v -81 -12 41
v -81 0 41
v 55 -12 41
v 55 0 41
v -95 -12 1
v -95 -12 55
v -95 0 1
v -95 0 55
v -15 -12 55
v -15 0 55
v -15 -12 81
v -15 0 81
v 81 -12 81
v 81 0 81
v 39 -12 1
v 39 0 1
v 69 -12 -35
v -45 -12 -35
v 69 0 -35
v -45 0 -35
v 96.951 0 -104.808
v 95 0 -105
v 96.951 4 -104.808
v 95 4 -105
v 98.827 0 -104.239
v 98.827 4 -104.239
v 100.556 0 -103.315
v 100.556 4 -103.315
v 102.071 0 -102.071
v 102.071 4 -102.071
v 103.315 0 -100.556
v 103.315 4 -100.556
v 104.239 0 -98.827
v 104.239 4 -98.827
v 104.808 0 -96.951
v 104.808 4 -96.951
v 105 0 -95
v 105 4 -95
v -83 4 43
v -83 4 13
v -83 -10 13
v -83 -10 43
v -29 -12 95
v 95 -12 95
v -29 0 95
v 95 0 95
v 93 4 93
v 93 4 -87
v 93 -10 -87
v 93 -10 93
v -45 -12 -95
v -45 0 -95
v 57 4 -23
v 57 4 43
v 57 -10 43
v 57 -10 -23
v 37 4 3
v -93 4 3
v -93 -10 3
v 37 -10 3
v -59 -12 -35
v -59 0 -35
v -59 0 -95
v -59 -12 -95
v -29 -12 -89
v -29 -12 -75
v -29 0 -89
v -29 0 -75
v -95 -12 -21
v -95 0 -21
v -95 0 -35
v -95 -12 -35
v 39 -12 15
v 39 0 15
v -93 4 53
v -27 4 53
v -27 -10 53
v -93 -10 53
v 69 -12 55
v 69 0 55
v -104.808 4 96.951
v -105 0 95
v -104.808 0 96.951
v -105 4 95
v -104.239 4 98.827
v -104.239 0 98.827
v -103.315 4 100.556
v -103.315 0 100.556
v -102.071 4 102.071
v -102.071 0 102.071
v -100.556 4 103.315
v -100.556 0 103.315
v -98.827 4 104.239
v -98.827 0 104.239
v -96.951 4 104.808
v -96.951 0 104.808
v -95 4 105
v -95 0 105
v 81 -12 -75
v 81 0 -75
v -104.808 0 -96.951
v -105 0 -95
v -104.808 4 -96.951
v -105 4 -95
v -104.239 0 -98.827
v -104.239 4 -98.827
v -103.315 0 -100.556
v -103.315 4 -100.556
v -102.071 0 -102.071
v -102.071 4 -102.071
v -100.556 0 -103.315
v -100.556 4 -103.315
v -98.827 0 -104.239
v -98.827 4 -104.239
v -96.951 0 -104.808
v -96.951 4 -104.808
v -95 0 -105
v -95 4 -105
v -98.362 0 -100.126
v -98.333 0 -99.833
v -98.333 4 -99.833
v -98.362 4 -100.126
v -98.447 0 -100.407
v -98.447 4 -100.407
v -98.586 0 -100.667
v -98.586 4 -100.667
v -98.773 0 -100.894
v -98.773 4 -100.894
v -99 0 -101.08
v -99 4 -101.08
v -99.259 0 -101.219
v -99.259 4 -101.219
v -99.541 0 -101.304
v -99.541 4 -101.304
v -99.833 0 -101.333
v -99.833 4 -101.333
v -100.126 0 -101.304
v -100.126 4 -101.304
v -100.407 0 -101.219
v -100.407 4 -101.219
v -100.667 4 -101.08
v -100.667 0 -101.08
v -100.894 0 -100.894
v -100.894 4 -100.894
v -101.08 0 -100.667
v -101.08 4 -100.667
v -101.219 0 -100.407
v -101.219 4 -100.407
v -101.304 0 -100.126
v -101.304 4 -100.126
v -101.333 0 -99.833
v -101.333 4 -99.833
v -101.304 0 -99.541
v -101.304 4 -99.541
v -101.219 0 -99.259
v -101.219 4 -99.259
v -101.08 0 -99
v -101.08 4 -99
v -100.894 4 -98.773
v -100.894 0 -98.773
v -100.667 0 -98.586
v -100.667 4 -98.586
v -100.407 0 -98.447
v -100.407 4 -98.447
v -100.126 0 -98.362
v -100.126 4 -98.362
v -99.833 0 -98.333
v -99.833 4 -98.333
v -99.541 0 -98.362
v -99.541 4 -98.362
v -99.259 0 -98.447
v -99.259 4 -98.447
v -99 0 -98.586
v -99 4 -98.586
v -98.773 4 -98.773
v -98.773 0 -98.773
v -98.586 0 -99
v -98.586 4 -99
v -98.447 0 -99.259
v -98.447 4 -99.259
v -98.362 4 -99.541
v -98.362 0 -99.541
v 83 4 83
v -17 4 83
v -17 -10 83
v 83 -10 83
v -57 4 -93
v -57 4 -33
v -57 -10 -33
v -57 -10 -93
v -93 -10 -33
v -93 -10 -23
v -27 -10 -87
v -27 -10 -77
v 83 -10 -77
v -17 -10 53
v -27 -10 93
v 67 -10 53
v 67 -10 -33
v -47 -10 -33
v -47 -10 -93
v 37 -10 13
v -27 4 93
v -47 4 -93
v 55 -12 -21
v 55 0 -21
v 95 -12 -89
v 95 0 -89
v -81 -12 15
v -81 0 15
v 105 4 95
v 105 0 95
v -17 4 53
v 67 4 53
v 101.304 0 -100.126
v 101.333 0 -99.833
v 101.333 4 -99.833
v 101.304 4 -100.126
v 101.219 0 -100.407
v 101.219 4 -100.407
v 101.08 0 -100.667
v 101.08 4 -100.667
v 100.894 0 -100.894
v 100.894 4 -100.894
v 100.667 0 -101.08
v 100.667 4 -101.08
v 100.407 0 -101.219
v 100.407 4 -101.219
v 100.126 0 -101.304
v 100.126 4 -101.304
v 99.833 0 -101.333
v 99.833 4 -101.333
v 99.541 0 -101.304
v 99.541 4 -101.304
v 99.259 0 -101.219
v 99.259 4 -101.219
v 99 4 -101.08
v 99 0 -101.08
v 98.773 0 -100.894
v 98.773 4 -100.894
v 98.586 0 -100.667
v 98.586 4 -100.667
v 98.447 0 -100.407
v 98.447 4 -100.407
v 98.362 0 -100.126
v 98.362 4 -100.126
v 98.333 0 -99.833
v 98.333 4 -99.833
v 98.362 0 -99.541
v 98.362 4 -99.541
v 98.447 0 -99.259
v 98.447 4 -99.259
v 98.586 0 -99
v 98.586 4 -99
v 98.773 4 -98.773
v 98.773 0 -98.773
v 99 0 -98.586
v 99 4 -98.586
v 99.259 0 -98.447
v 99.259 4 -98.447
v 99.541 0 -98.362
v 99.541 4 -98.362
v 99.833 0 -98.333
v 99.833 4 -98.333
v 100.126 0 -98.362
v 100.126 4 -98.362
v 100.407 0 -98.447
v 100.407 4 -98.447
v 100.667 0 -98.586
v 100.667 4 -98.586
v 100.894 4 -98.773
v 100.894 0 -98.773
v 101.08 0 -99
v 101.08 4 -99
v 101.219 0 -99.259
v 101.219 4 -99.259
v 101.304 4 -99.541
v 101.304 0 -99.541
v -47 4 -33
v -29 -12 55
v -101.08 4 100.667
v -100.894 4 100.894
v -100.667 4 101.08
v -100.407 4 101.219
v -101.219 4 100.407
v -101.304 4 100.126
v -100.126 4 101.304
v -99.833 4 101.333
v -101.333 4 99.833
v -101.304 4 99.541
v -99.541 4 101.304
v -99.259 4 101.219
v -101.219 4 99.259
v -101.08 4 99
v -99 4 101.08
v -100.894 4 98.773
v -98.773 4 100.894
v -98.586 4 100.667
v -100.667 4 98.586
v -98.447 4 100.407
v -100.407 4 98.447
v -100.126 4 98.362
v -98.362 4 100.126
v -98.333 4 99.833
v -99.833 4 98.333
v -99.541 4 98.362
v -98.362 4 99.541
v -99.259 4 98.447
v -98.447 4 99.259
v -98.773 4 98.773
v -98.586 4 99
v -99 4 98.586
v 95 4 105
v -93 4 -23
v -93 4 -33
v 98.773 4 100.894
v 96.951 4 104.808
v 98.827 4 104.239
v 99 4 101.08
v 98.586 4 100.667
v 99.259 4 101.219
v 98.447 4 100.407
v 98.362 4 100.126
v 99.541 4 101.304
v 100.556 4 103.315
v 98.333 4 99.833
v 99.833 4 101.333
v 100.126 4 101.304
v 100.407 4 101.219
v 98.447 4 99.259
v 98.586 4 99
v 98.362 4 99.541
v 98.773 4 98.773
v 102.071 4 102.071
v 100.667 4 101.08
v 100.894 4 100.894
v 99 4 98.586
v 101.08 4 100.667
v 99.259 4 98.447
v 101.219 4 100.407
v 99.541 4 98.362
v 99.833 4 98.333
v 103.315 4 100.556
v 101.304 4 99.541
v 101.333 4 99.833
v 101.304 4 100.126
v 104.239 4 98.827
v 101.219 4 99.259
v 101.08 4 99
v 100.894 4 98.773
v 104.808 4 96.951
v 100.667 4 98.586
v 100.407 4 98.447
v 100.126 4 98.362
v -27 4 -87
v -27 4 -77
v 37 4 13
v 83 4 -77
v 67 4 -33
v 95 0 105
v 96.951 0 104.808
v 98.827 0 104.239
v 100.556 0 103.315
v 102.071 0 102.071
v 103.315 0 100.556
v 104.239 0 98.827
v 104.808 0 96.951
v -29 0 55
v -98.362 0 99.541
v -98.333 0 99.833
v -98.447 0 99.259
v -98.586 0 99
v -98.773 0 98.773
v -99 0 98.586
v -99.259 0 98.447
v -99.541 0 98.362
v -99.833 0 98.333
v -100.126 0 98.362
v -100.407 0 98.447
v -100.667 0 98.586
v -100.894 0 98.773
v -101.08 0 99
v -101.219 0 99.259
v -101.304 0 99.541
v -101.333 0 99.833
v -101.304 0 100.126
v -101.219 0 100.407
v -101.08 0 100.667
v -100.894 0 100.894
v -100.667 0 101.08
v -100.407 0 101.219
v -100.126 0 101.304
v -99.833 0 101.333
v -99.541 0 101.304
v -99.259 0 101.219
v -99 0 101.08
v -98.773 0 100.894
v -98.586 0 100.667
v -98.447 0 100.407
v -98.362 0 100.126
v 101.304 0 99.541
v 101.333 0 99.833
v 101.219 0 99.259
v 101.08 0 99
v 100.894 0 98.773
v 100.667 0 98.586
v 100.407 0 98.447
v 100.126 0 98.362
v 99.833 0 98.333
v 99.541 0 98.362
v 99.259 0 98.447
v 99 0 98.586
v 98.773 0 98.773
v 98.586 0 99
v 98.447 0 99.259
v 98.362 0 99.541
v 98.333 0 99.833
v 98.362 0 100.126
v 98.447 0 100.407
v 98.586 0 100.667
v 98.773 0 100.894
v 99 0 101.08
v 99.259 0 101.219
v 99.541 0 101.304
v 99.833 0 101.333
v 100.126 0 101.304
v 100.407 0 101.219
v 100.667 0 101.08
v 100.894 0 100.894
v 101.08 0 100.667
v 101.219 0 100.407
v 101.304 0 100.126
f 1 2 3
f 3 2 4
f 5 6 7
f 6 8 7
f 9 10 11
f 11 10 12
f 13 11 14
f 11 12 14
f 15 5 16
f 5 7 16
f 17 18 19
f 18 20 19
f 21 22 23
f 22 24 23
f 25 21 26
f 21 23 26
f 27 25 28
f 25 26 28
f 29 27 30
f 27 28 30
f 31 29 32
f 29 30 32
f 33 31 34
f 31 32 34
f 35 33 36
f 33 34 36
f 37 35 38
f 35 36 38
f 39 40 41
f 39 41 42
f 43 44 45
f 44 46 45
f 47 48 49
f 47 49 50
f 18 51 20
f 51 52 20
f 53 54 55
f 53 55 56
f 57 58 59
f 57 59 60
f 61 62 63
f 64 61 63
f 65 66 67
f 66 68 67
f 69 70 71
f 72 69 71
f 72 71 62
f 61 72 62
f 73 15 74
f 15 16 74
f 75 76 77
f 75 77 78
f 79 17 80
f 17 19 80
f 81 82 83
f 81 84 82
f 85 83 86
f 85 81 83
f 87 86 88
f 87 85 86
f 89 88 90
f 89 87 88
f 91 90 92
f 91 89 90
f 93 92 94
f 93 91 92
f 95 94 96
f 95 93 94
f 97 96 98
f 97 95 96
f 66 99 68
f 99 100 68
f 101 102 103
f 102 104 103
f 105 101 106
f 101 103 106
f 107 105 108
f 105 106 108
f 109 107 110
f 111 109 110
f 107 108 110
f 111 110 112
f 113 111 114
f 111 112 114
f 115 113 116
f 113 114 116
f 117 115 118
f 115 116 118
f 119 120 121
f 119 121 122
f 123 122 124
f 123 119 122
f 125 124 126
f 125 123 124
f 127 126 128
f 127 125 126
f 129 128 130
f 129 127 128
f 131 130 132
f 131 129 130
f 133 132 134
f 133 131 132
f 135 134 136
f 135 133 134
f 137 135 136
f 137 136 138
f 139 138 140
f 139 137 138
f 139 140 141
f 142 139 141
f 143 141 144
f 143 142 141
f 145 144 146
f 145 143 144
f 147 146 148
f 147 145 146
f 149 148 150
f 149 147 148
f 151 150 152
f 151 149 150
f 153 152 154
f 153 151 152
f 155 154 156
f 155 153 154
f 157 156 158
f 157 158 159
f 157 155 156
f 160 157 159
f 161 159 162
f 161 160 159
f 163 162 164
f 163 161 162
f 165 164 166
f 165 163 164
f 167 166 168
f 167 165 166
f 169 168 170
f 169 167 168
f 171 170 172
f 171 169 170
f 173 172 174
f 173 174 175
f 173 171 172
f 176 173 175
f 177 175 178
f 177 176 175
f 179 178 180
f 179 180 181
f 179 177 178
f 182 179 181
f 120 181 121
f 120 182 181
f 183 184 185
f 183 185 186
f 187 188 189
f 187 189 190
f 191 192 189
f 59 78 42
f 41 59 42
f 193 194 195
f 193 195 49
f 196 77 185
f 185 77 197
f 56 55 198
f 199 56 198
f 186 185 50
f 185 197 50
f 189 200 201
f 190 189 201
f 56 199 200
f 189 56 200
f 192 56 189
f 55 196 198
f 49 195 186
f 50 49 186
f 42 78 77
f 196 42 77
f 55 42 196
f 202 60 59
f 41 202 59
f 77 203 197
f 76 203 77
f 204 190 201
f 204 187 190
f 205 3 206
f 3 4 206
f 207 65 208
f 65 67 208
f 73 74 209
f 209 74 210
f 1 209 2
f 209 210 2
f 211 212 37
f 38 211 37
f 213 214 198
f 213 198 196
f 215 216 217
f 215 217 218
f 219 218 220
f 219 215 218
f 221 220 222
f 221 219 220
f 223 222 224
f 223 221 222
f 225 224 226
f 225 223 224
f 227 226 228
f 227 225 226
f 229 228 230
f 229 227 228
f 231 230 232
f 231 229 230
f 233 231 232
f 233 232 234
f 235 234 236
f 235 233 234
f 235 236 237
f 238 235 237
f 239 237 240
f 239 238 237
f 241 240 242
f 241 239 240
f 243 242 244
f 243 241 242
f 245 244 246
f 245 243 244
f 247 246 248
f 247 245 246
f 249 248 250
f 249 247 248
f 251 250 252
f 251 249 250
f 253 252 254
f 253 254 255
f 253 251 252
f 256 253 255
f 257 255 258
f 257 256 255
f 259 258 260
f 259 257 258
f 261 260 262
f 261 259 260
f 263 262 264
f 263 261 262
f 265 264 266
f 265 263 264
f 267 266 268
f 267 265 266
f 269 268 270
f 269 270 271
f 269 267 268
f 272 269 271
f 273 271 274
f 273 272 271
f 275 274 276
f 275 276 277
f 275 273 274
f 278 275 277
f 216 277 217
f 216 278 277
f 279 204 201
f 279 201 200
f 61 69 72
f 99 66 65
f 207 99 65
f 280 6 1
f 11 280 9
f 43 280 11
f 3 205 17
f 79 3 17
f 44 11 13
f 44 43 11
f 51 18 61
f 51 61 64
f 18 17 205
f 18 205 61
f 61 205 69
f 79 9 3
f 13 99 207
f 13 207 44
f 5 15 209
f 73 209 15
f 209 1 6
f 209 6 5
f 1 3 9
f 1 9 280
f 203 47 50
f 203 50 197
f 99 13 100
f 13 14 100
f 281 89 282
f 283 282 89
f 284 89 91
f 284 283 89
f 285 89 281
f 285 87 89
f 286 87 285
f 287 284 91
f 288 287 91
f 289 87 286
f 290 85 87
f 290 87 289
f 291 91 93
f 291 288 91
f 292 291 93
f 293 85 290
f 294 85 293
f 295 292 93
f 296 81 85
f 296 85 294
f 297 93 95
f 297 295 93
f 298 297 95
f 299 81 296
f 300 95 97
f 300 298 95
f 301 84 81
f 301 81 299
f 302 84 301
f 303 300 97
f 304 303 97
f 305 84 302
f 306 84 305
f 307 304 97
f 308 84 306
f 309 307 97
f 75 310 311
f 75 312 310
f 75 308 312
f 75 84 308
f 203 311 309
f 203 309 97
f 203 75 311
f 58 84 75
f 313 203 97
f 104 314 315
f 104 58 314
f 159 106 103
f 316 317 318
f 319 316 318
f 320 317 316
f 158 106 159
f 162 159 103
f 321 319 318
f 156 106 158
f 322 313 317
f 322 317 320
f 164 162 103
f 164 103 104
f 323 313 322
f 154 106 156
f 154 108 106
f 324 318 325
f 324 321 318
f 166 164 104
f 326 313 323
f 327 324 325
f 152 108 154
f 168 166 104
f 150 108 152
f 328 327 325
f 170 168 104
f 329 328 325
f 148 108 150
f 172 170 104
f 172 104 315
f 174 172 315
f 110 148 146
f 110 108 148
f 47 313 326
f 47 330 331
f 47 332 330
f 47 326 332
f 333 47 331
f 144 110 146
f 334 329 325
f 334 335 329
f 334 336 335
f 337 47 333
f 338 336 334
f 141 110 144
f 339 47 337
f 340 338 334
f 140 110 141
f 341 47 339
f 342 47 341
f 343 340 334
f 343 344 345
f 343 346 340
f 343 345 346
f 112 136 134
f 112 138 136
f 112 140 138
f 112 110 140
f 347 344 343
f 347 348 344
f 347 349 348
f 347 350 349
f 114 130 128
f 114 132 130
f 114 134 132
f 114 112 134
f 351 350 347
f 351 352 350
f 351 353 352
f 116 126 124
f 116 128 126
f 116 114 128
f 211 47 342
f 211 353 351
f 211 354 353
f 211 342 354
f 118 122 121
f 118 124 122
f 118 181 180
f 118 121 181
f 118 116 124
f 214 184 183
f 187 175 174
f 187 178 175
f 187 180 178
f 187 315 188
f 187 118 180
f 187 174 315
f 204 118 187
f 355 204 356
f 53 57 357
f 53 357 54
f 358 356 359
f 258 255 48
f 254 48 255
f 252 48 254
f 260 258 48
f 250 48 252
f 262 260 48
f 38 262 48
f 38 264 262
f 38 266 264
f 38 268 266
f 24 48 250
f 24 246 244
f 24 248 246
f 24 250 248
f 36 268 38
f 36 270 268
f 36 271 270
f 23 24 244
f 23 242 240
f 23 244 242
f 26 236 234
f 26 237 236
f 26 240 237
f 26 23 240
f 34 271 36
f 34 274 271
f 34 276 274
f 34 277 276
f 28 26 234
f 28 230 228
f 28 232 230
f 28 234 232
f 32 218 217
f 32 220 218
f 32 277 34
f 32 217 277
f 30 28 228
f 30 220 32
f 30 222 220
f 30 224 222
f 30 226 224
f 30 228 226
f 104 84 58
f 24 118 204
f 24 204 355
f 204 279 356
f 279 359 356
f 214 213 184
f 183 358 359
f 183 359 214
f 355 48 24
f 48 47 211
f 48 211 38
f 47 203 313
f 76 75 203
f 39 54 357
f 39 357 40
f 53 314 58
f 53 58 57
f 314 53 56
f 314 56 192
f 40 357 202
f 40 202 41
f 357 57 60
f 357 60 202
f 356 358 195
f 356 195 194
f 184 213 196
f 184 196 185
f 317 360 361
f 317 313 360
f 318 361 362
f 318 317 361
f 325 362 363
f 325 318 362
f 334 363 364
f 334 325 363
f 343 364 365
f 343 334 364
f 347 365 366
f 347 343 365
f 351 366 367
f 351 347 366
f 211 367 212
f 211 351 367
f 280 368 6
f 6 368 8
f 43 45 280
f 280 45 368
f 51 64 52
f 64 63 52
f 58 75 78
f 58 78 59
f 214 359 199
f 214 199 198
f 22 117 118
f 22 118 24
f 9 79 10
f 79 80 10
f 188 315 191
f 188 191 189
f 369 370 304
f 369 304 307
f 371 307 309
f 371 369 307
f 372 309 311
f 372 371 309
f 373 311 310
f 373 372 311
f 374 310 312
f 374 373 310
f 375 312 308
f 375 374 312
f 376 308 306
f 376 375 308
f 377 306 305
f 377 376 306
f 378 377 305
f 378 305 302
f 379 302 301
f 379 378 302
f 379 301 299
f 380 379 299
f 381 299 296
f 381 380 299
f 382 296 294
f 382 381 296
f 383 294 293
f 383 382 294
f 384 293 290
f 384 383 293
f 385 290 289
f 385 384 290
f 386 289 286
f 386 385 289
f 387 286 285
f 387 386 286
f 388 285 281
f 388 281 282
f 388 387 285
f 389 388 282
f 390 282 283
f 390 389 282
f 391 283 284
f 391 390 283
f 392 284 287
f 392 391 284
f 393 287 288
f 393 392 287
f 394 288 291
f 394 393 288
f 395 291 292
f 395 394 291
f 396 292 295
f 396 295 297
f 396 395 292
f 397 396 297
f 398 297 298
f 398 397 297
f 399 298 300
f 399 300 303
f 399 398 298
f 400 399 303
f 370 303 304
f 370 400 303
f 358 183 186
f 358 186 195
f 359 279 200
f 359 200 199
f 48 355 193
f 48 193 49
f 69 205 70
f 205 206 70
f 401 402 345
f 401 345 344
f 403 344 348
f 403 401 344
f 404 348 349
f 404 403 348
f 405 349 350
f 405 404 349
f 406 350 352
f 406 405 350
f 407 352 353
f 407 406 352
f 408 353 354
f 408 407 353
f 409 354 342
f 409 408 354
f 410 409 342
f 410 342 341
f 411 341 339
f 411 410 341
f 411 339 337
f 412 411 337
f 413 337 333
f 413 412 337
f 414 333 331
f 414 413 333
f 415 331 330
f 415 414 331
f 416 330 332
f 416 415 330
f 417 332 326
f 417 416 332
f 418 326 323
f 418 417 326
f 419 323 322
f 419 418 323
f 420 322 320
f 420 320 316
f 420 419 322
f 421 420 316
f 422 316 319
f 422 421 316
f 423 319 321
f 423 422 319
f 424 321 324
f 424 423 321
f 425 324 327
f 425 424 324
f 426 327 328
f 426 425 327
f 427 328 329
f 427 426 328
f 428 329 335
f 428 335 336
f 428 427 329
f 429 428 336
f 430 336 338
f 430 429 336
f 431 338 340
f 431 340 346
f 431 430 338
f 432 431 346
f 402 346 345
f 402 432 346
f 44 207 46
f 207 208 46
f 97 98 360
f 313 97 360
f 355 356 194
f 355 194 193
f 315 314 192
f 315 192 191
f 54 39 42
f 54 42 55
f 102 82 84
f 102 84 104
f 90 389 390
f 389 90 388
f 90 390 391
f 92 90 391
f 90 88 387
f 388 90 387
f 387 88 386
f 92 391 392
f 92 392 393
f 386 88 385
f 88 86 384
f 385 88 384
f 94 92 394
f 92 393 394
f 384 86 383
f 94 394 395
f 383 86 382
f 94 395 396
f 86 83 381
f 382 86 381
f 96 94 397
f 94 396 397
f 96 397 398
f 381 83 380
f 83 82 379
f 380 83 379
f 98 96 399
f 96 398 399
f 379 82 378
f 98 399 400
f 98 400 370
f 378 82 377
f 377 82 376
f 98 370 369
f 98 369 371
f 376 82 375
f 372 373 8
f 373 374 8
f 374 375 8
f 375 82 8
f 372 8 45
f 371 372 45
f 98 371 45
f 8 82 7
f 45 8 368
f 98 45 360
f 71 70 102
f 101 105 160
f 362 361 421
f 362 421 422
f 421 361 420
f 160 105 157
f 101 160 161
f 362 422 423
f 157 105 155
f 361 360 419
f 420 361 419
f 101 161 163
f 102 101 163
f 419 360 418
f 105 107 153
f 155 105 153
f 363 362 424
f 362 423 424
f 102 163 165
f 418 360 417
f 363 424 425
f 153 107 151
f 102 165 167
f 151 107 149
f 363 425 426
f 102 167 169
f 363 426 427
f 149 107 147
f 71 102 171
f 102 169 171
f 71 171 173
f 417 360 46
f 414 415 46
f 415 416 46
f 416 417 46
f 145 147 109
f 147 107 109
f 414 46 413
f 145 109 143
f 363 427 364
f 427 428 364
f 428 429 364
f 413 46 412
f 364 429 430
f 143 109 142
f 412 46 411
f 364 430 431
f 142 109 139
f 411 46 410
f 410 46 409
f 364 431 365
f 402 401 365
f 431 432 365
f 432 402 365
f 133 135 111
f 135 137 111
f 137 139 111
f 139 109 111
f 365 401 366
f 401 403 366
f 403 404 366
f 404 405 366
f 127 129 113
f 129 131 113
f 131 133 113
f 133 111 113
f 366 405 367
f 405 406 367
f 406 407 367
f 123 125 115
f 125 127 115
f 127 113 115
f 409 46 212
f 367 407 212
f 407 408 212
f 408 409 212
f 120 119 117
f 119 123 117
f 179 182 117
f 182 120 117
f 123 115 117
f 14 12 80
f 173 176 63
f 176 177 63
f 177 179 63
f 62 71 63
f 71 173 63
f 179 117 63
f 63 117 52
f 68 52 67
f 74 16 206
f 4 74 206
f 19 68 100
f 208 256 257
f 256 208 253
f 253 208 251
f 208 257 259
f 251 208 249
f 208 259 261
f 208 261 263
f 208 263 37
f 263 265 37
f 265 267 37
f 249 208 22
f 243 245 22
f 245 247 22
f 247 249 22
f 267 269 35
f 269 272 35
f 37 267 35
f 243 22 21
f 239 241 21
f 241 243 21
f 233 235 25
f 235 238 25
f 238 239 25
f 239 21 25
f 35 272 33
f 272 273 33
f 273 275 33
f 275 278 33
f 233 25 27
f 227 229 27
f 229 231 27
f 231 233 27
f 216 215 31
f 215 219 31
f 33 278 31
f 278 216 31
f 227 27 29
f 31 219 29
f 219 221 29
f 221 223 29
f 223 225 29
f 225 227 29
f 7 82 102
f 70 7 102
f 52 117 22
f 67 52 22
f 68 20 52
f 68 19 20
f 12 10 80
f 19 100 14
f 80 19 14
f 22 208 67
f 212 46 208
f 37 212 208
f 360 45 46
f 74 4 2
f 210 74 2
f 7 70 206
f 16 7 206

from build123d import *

# Parameters (mm, degrees)
SKETCH1_W           = 210
SKETCH1_H           = 210
MAINEXTRUDE_DEPTH   = 4
SKETCH1_6_R         = 1.5
SCREWHOLES_DEPTH    = 4
ROUNDEDCORNERS_R    = 10
TRENCH_DEPTH        = 12
TRENCH_WALLS_DEPTH  = 10
TRENCH_BOTTOM_DEPTH = 2


with BuildPart() as part:
    # Sketch1 → MainExtrude (new body)
    with BuildSketch(Plane(origin=(0, 0, 0), x_dir=(1, 0, 0), z_dir=(0, 1, 0))):
        Rectangle(SKETCH1_W, SKETCH1_H)
    extrude(amount=MAINEXTRUDE_DEPTH)

    # Sketch1<6> → ScrewHoles (cut)
    with BuildSketch(Plane(origin=(0, 0, 0), x_dir=(1, 0, 0), z_dir=(0, 1, 0))):
        with Locations((-99.833273811, 99.833273811)):
            Circle(SKETCH1_6_R)
        with Locations((-99.833273811, -99.833273811)):
            Circle(SKETCH1_6_R)
        with Locations((99.833273811, -99.833273811)):
            Circle(SKETCH1_6_R)
        with Locations((99.833273811, 99.833273811)):
            Circle(SKETCH1_6_R)
    extrude(amount=SCREWHOLES_DEPTH, mode=Mode.SUBTRACT)

    # RoundedCorners
    roundedcorners_edges = [part.edges().sort_by_distance(p)[0] for p in [
        (-105, 2, -105),
        (-105, 2, 105),
        (105, 2, 105),
        (105, 2, -105),
    ]]
    fillet(roundedcorners_edges, radius=ROUNDEDCORNERS_R)

    # Sketch3 → Trench (cut)
    with BuildSketch(Plane(origin=(0, 0, 0), x_dir=(1, 0, 0), z_dir=(0, 1, 0))):
        Polygon((-57, 93), (-57, 33), (-93, 33), (-93, 23), (57, 23), (57, -43), (-83, -43), (-83, -13), (37, -13), (37, -3), (-93, -3), (-93, -53), (-27, -53), (-27, -93), (93, -93), (93, 87), (-27, 87), (-27, 77), (83, 77), (83, -83), (-17, -83), (-17, -53), (67, -53), (67, 33), (-47, 33), (-47, 93), align=None)
    extrude(amount=TRENCH_DEPTH, mode=Mode.SUBTRACT)

    # Sketch7 → Trench Walls (add)
    with BuildSketch(Plane.XZ):
        Polygon((-59, -95), (-45, -95), (-45, -35), (69, -35), (69, 55), (-15, 55), (-15, 81), (81, 81), (81, -75), (-29, -75), (-29, -89), (95, -89), (95, 95), (-29, 95), (-29, 55), (-95, 55), (-95, 1), (39, 1), (39, 15), (-81, 15), (-81, 41), (55, 41), (55, -21), (-95, -21), (-95, -35), (-59, -35), align=None)
        Polygon((-57, -93), (-47, -93), (-47, -33), (67, -33), (67, 53), (-17, 53), (-17, 83), (83, 83), (83, -77), (-27, -77), (-27, -87), (93, -87), (93, 93), (-27, 93), (-27, 53), (-93, 53), (-93, 3), (37, 3), (37, 13), (-83, 13), (-83, 43), (57, 43), (57, -23), (-93, -23), (-93, -33), (-57, -33), align=None, mode=Mode.SUBTRACT)
    extrude(amount=TRENCH_WALLS_DEPTH)

    # Sketch8 → Trench Bottom (add)
    with BuildSketch(Plane.XZ.offset(10)):
        Polygon((-59, -35), (-59, -95), (-45, -95), (-45, -35), (69, -35), (69, 55), (-15, 55), (-15, 81), (81, 81), (81, -75), (-29, -75), (-29, -89), (95, -89), (95, 95), (-29, 95), (-29, 55), (-95, 55), (-95, 1), (39, 1), (39, 15), (-81, 15), (-81, 41), (55, 41), (55, -21), (-95, -21), (-95, -35), align=None)
    extrude(amount=TRENCH_BOTTOM_DEPTH)


solid = part.part
